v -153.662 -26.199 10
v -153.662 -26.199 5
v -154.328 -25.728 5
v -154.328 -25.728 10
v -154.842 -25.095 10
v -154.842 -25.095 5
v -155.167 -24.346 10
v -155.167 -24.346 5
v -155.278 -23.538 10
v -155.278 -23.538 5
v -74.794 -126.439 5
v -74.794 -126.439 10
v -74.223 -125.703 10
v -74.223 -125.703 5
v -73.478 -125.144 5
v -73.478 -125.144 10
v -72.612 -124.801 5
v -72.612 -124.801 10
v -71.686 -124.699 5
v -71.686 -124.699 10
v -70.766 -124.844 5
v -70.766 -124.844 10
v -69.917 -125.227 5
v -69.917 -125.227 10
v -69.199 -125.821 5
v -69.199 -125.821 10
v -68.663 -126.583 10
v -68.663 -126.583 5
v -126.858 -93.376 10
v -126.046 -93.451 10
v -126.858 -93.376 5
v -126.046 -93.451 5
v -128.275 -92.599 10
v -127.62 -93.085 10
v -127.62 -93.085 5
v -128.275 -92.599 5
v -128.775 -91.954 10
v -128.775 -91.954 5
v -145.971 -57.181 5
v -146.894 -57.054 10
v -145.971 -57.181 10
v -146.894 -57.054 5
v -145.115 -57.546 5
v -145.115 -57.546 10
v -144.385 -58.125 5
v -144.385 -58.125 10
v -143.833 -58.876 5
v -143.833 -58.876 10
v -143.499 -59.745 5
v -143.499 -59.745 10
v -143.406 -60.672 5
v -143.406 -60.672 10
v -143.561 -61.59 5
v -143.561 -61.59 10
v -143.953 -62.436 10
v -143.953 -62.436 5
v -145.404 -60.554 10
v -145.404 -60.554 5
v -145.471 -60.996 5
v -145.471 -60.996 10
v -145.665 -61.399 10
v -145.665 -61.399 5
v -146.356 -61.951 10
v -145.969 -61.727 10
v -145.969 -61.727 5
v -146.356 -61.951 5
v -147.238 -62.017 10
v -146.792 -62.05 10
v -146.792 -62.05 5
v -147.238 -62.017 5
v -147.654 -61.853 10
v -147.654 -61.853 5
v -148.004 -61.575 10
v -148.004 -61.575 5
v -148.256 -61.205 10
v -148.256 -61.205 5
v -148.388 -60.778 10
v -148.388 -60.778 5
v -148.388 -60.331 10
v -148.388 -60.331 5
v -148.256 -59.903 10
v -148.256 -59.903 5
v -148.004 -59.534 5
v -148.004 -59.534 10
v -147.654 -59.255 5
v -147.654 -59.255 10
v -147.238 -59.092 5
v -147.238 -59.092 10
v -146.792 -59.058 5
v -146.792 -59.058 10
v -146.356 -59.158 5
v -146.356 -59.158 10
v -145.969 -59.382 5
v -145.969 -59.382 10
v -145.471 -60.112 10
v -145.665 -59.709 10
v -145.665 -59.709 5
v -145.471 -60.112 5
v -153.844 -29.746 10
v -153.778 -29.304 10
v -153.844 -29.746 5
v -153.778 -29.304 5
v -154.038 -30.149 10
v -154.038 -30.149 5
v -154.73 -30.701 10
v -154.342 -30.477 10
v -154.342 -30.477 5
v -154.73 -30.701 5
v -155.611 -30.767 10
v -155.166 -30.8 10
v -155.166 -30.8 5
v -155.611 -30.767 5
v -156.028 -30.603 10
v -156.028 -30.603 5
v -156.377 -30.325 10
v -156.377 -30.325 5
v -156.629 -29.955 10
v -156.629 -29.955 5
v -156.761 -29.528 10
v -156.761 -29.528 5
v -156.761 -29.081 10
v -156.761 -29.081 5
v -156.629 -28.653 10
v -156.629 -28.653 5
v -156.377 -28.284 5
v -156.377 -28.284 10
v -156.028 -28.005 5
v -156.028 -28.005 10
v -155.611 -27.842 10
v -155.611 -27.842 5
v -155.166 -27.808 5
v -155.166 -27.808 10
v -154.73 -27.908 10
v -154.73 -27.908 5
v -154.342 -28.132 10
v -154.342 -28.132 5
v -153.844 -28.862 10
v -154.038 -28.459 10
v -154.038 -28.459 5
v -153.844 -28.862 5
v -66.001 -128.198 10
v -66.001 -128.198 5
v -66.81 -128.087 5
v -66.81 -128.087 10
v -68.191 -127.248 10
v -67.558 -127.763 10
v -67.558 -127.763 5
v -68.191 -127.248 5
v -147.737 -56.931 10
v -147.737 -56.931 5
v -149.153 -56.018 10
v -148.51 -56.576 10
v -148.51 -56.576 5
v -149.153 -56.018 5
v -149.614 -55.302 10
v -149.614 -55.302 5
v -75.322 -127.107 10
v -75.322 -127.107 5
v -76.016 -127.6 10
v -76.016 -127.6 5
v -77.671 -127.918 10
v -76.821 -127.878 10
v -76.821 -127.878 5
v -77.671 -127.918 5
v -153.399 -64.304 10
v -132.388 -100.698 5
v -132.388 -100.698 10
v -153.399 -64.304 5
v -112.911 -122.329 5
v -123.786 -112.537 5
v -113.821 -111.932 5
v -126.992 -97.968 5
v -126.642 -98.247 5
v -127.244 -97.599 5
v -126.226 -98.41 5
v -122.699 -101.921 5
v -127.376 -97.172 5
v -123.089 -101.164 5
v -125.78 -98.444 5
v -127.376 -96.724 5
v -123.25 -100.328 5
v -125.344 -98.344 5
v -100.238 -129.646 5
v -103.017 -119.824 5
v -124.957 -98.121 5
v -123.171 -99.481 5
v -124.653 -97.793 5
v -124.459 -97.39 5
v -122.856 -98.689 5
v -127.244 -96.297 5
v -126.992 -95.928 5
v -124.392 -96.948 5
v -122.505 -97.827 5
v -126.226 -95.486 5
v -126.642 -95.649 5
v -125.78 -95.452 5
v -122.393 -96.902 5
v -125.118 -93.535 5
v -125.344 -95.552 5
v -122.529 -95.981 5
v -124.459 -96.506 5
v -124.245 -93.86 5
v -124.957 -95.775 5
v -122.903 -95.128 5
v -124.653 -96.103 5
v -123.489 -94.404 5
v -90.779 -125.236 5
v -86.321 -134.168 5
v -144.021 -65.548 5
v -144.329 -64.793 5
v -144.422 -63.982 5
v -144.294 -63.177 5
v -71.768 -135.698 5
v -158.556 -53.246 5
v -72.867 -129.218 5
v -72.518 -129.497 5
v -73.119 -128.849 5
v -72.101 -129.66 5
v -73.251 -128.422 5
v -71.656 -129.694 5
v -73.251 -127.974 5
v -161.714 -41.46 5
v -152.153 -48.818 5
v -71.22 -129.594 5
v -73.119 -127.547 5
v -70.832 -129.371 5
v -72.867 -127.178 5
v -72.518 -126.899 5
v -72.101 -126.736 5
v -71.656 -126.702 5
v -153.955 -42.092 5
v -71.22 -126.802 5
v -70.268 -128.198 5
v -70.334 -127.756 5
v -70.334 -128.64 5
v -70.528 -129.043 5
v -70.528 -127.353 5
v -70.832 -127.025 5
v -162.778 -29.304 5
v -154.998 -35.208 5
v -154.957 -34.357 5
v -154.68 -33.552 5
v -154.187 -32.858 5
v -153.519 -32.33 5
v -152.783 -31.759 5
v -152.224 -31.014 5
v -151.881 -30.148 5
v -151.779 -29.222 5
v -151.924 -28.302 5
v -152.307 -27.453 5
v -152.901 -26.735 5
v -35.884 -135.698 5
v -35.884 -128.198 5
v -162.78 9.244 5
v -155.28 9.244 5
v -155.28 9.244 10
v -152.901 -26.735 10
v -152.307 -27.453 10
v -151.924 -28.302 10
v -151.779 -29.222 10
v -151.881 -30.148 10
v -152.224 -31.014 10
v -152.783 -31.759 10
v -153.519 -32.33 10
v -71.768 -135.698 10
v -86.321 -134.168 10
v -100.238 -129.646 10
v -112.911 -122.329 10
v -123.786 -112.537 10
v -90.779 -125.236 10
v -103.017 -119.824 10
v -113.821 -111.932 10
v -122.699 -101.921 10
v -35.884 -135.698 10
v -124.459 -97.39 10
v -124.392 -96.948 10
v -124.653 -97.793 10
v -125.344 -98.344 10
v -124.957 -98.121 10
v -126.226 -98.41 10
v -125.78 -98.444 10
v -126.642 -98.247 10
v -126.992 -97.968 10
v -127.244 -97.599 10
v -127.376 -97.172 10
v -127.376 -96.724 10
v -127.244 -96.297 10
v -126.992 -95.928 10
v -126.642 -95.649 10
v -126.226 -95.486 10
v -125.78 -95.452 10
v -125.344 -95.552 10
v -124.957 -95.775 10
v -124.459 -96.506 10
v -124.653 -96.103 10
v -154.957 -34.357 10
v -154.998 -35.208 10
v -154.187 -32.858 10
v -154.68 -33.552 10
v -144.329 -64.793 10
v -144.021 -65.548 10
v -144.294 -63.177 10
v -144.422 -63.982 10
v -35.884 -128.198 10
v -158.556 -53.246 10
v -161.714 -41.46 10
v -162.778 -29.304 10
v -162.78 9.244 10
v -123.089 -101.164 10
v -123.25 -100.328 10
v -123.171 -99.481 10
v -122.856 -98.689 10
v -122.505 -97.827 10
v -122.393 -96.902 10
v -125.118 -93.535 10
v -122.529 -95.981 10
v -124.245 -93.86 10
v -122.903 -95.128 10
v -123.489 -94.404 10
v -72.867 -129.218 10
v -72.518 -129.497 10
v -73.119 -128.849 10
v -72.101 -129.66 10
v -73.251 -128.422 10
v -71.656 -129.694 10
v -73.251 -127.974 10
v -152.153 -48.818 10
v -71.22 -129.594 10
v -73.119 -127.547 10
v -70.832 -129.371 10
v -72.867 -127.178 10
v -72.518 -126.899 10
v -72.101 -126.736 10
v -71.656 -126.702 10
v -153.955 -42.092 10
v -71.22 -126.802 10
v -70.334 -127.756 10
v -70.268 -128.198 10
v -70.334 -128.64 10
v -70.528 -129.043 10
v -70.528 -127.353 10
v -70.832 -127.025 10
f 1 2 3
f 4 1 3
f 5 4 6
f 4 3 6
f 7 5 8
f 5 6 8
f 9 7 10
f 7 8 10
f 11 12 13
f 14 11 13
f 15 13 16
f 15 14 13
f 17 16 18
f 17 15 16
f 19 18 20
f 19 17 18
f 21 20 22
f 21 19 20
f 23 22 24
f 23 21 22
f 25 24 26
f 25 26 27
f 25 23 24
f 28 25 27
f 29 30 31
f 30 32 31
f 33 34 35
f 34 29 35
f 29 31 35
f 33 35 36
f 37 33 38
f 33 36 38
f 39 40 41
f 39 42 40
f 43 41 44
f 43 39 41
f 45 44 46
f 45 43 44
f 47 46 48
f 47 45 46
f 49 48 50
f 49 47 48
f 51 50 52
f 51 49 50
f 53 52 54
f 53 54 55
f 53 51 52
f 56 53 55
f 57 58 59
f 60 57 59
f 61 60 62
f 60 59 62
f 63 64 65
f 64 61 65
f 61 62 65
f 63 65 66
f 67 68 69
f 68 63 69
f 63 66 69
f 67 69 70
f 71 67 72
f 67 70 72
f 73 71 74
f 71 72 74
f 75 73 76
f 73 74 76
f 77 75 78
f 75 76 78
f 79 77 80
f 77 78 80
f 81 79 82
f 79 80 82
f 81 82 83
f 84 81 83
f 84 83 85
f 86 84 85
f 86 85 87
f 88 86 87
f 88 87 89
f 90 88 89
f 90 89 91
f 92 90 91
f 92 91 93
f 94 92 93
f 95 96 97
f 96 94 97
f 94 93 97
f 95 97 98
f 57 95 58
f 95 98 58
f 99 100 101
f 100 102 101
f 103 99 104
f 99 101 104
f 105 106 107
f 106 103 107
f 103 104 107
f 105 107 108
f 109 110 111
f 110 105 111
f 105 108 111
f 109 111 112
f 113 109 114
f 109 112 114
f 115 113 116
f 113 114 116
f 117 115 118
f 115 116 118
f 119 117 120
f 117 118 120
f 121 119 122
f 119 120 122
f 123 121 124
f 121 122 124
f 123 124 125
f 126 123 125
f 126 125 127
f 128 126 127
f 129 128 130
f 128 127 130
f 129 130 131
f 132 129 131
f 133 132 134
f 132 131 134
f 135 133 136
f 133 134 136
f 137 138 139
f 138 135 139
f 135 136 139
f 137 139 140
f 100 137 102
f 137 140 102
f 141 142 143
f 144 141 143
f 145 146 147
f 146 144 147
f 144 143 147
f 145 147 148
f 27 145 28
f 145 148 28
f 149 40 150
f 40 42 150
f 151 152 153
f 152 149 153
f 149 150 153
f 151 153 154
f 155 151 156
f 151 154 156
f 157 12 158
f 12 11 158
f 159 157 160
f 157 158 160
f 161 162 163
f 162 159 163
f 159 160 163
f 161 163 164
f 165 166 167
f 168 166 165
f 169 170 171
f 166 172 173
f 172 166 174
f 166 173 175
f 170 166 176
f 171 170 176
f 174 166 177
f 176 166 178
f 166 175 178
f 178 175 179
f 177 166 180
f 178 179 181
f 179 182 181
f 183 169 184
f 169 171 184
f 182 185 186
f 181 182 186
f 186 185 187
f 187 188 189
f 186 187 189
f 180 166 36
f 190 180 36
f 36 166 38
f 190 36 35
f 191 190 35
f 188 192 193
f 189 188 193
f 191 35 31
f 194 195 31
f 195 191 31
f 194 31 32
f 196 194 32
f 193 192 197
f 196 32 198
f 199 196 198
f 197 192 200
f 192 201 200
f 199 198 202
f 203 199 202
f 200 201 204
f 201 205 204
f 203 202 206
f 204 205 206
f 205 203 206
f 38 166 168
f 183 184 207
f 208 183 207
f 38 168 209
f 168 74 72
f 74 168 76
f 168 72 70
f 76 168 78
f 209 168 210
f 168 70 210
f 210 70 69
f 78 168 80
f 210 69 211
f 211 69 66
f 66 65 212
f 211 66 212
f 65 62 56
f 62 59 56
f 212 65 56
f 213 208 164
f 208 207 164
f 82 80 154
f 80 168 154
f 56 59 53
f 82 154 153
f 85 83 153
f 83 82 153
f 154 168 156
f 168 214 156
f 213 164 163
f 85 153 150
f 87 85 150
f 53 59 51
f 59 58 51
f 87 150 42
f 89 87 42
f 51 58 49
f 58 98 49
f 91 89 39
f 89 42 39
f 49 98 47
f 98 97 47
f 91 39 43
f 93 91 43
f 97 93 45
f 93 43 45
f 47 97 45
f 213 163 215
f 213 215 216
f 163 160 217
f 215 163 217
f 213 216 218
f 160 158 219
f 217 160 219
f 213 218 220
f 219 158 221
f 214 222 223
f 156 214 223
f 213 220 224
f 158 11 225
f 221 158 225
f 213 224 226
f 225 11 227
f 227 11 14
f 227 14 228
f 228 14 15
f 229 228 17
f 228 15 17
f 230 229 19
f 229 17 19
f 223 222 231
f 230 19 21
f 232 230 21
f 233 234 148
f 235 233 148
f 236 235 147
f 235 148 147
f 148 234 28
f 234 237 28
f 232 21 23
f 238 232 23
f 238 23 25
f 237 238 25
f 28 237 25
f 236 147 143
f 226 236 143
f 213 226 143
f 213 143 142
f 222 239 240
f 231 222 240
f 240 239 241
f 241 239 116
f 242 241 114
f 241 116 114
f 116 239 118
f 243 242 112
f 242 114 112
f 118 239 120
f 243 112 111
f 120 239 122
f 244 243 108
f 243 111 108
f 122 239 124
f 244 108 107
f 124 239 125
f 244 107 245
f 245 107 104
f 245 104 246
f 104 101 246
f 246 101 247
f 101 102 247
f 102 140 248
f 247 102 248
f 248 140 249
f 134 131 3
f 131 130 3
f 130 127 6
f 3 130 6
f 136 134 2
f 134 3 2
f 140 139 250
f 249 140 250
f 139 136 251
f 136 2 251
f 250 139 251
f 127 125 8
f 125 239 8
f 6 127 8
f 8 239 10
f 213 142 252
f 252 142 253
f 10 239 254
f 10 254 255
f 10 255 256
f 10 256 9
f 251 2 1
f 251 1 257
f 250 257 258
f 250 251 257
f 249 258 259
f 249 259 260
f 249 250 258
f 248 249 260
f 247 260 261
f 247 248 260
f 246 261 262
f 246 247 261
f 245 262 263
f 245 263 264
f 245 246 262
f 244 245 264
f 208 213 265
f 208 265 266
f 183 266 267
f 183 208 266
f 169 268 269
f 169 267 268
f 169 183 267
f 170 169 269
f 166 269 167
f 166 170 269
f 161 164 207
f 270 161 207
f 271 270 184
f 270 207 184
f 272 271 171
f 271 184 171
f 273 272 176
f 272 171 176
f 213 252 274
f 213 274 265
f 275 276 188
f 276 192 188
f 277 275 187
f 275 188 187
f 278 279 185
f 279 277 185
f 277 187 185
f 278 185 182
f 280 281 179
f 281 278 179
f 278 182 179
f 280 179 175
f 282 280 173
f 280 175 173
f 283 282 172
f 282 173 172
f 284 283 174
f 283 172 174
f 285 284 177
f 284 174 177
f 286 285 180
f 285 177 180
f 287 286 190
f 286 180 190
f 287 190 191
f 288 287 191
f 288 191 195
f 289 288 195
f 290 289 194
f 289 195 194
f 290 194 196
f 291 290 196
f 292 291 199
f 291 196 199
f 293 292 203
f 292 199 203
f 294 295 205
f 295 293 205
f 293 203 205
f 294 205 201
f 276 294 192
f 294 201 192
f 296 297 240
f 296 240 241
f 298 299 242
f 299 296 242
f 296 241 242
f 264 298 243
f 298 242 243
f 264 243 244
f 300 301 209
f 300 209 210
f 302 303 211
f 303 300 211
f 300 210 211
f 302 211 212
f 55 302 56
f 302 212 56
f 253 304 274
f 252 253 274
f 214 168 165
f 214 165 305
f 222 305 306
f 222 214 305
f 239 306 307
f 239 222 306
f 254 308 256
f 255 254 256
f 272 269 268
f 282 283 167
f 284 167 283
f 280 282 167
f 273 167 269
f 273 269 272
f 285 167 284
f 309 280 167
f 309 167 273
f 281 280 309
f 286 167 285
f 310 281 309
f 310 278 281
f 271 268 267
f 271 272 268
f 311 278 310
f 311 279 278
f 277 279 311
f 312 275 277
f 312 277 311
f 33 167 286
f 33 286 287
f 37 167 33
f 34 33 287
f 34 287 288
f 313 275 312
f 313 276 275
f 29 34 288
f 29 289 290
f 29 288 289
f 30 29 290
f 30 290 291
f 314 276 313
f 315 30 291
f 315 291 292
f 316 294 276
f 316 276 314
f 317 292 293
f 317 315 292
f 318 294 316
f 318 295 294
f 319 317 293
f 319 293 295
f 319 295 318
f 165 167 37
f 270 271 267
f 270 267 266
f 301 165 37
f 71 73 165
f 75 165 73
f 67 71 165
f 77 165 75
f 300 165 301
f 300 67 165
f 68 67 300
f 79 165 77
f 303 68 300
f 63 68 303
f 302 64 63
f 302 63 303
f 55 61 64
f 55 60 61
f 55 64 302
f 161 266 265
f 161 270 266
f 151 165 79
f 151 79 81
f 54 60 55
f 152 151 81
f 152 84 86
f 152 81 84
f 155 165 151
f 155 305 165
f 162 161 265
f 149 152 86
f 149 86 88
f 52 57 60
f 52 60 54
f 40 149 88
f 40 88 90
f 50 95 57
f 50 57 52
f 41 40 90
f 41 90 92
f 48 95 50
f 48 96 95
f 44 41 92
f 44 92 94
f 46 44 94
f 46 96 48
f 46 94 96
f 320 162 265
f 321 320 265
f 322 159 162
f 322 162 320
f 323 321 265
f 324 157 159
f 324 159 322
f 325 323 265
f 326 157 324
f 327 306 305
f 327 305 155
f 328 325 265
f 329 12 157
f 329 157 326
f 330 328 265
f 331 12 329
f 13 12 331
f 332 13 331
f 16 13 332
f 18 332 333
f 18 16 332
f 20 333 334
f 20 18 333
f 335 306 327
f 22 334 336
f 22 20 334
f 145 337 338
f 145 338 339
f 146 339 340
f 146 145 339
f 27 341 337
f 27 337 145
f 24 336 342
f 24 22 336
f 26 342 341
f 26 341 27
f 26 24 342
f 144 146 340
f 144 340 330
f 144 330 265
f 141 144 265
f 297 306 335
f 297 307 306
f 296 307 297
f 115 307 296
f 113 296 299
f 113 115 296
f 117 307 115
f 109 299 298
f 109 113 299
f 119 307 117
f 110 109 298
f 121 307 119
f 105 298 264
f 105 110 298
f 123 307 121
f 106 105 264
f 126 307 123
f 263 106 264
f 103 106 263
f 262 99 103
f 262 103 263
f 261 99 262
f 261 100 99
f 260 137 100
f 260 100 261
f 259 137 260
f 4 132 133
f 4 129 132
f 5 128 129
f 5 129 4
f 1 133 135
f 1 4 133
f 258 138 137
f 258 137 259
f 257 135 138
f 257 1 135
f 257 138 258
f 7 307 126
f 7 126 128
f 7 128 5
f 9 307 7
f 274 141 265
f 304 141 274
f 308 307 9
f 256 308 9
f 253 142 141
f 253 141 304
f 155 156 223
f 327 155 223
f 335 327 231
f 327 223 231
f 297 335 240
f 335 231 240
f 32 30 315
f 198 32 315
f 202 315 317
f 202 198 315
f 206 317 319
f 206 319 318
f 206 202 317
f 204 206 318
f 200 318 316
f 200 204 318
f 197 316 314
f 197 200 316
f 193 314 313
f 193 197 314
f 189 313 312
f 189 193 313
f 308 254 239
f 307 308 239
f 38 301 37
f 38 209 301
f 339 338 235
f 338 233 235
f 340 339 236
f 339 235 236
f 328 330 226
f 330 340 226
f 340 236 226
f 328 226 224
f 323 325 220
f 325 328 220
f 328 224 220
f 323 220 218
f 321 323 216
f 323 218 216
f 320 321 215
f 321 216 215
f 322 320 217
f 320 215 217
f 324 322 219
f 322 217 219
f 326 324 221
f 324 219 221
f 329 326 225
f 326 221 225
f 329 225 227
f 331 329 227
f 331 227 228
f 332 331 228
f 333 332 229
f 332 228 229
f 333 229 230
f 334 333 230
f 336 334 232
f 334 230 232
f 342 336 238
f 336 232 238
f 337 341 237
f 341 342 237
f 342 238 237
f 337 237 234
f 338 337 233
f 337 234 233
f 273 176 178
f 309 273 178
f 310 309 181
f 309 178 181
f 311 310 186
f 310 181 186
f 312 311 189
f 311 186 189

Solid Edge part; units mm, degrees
sketch "Sketch1" plane through (0.0007, 14.651, 5) normal (0, 0, 1) x (1, 0, 0)
  line L0 (-114.0407, 98.8093) -> (-57.2599, 131.5929)
  arc A0 (-54.1474, 131.5247) -> (-57.2599, 131.5929) centre (-55.7598, 128.9948) ccw
  arc A1 (-47.0142, 137.1861) -> (-48.7662, 134.4664) centre (-45.7662, 134.458) ccw
  arc A2 (-47.0142, 137.1861) -> (-26.9146, 142.5706) centre (-21.0226, 80.3698) cw
  arc A3 (-24.0376, 141.0909) -> (-26.9146, 142.5706) centre (-26.6317, 139.5839) ccw
  arc A4 (-15.245, 142.849) -> (-17.9063, 141.2336) centre (-15.245, 139.849) ccw
  line L1 (-15.245, 142.849) -> (15.2436, 142.849)
  arc A5 (17.905, 141.2336) -> (15.2436, 142.849) centre (15.2436, 139.849) ccw
  arc A6 (26.9132, 142.5696) -> (24.036, 141.0904) centre (26.6298, 139.583) ccw
  arc A7 (26.9132, 142.5696) -> (47.0027, 137.1869) centre (21.0099, 80.3561) cw
  arc A8 (48.7549, 134.4673) -> (47.0027, 137.1869) centre (45.7549, 134.4587) ccw
  arc A9 (57.2487, 131.5943) -> (54.1362, 131.526) centre (55.7487, 128.9962) ccw
  line L2 (57.2487, 131.5943) -> (114.0299, 98.8129)
  arc A10 (115.5271, 96.0833) -> (114.0299, 98.8129) centre (112.5299, 96.2148) ccw
  arc A11 (124.0003, 92.7805) -> (120.7849, 92.9052) centre (122.2944, 90.3127) ccw
  arc A12 (124.0003, 92.7805) -> (155.0355, 39.027) centre (82.7747, 33.1424) cw
  arc A13 (153.5358, 36.1799) -> (155.0355, 39.027) centre (152.0454, 38.7835) ccw
  arc A14 (155.2747, 27.3761) -> (153.6593, 30.0375) centre (152.2747, 27.3761) ccw
  line L3 (155.2747, 27.3761) -> (155.2747, -38.192)
  arc A15 (153.6593, -40.8534) -> (155.2747, -38.192) centre (152.2747, -38.192) ccw
  arc A16 (154.9954, -49.8615) -> (153.5161, -46.9844) centre (152.0088, -49.5782) ccw
  arc A17 (154.9954, -49.8615) -> (149.6134, -69.9554) centre (92.7533, -43.9583) cw
  arc A18 (146.8942, -71.7079) -> (149.6134, -69.9554) centre (146.8851, -68.7079) ccw
  arc A19 (144.0217, -80.2016) -> (143.9534, -77.0892) centre (141.4236, -78.7016) ccw
  line L4 (144.0217, -80.2016) -> (127.6444, -108.5679)
  arc A20 (122.7007, -116.5716) -> (122.8583, -113.3403) centre (120.256, -114.8329) ccw
  arc A21 (77.6703, -142.5696) -> (122.7007, -116.5716) centre (71.767, -80.3476) ccw
  arc A22 (74.7931, -141.0904) -> (77.6703, -142.5696) centre (77.3869, -139.583) ccw
  arc A23 (66.0007, -142.849) -> (68.6621, -141.2336) centre (66.0007, -139.849) ccw
  line L5 (5.7656, -142.849) -> (66.0007, -142.849)
  arc A24 (3.1042, -141.2336) -> (5.7656, -142.849) centre (5.7656, -139.849) ccw
  arc A25 (-5.767, -142.849) -> (-3.1056, -141.2336) centre (-5.767, -139.849) ccw
  line L6 (-66.0021, -142.849) -> (-5.767, -142.849)
  arc A26 (-68.6634, -141.2336) -> (-66.0021, -142.849) centre (-66.0021, -139.849) ccw
  arc A27 (-77.6716, -142.5694) -> (-74.7944, -141.0903) centre (-77.3881, -139.5828) ccw
  arc A28 (-122.6994, -116.5717) -> (-77.6716, -142.5694) centre (-71.7665, -80.349) ccw
  arc A29 (-122.857, -113.3404) -> (-122.6994, -116.5717) centre (-120.2547, -114.833) ccw
  arc A30 (-128.7762, -106.6053) -> (-126.0465, -108.1024) centre (-126.1781, -105.1053) ccw
  line L7 (-144.0218, -80.199) -> (-128.7762, -106.6053)
  arc A31 (-143.9535, -77.0865) -> (-144.0218, -80.199) centre (-141.4237, -78.699) ccw
  arc A32 (-149.6144, -69.9531) -> (-146.8949, -71.7053) centre (-146.8862, -68.7053) ccw
  arc A33 (-154.9987, -49.8585) -> (-149.6144, -69.9531) centre (-92.7672, -43.9523) ccw
  arc A34 (-153.5196, -46.9813) -> (-154.9987, -49.8585) centre (-152.0122, -49.5751) ccw
  arc A35 (-155.2786, -38.189) -> (-153.6631, -40.8503) centre (-152.2786, -38.1889) ccw
  line L8 (-155.2818, 27.3758) -> (-155.2786, -38.189)
  arc A36 (-153.6665, 30.0373) -> (-155.2818, 27.3758) centre (-152.2818, 27.376) ccw
  arc A37 (-155.0428, 39.0267) -> (-153.5432, 36.1796) centre (-152.0527, 38.7832) ccw
  arc A38 (-124.0109, 92.7765) -> (-155.0428, 39.0267) centre (-82.7847, 33.1421) ccw
  arc A39 (-120.7955, 92.9014) -> (-124.0109, 92.7765) centre (-122.3049, 90.3088) ccw
  arc A40 (-114.0407, 98.8093) -> (-115.5378, 96.0796) centre (-112.5406, 96.2112) ccw
  arc A41 (-48.7662, 134.4664) -> (-54.1474, 131.5247) centre (-52.2662, 134.4761) cw
  arc A42 (-17.9064, 141.2336) -> (-24.0377, 141.0909) centre (-21.0113, 142.849) cw
  arc A43 (24.036, 141.0904) -> (17.905, 141.2336) centre (21.0099, 142.849) cw
  arc A44 (54.1362, 131.526) -> (48.7549, 134.4673) centre (52.2549, 134.4774) cw
  arc A45 (120.7849, 92.9052) -> (115.5271, 96.0832) centre (119.0237, 95.9298) cw
  arc A46 (153.6593, 30.0375) -> (153.5358, 36.1799) centre (155.2747, 33.1424) cw
  arc A47 (153.5161, -46.9844) -> (153.6593, -40.8534) centre (155.2747, -43.9583) cw
  arc A48 (143.9534, -77.0891) -> (146.8942, -71.7079) centre (146.9048, -75.2079) cw
  arc A49 (122.8584, -113.3404) -> (127.6444, -108.5679) centre (125.8944, -111.599) cw
  arc A50 (68.6621, -141.2336) -> (74.7931, -141.0904) centre (71.767, -142.849) cw
  arc A51 (-3.1056, -141.2336) -> (3.1042, -141.2336) centre (-0.0007, -142.849) cw
  arc A52 (-74.7944, -141.0903) -> (-68.6635, -141.2336) centre (-71.7684, -142.849) cw
  arc A53 (-126.0466, -108.1024) -> (-122.857, -113.3404) centre (-125.8931, -111.599) cw
  arc A54 (-146.8949, -71.7053) -> (-143.9536, -77.0866) centre (-146.905, -75.2053) cw
  arc A55 (-153.6632, -40.8503) -> (-153.5196, -46.9813) centre (-155.2784, -43.9553) cw
  arc A56 (-153.5432, 36.1796) -> (-153.6665, 30.0373) centre (-155.2821, 33.1421) cw
  arc A57 (-115.5377, 96.0796) -> (-120.7955, 92.9014) centre (-119.0344, 95.926) cw
  line L9 (-56.0166, 140.971) -> (-122.7845, 102.4212)
  arc A58 (-162.7821, 33.1421) -> (-122.7845, 102.4212) centre (-82.7847, 33.1421) cw
  line L10 (-162.7821, 33.1421) -> (-162.7784, -43.9553)
  arc A59 (-162.7784, -43.9553) -> (-153.4002, -78.9553) centre (-92.7784, -43.9553) ccw
  line L11 (-132.3882, -115.349) -> (-153.4002, -78.9553)
  arc A60 (-132.3882, -115.349) -> (-71.7683, -150.349) centre (-71.7665, -80.349) ccw
  line L12 (71.767, -150.349) -> (-71.7683, -150.349)
  arc A61 (71.767, -150.349) -> (132.3896, -115.349) centre (71.7678, -80.349) ccw
  line L13 (132.3896, -115.349) -> (153.4002, -78.9576)
  arc A62 (162.7747, -43.9583) -> (153.4002, -78.9576) centre (92.791, -43.9684) cw
  line L14 (162.7747, 33.1424) -> (162.7747, -43.9583)
  arc A63 (122.7736, 102.4251) -> (162.7747, 33.1424) centre (82.7747, 33.1424) cw
  line L15 (56.0045, 140.9728) -> (122.7736, 102.4251)
  arc A64 (21.0099, 150.349) -> (56.0045, 140.9728) centre (21.008, 80.349) cw
  line L16 (-21.0112, 150.349) -> (21.0099, 150.349)
  arc A65 (-32.5074, 149.4015) -> (-21.0112, 150.349) centre (-20.997, 79.961) cw
  arc A66 (-44.641, 146.2432) -> (-32.5074, 149.4015) centre (-21.0122, 80.3518) cw
  arc A67 (-56.0166, 140.971) -> (-44.641, 146.2432) centre (-21.0122, 80.3518) cw
  circle A68 centre (-71.7683, -142.849) radius 1.5
  circle A69 centre (-0.0007, -142.849) radius 1.5
  circle A70 centre (-125.893, -111.599) radius 1.5
  circle A71 centre (-146.905, -75.2053) radius 1.5
  circle A72 centre (-155.2784, -43.9553) radius 1.5
  circle A73 centre (-155.2821, 33.1421) radius 1.5
  circle A74 centre (-119.0344, 95.9261) radius 1.5
  circle A75 centre (-52.2662, 134.4761) radius 1.5
  circle A76 centre (-21.0112, 142.849) radius 1.5
  circle A77 centre (21.0099, 142.849) radius 1.5
  circle A78 centre (52.2549, 134.4774) radius 1.5
  circle A79 centre (119.0237, 95.9298) radius 1.5
  circle A80 centre (155.2747, 33.1424) radius 1.5
  circle A81 centre (155.2747, -43.9583) radius 1.5
  circle A82 centre (146.9048, -75.2079) radius 1.5
  circle A83 centre (125.8944, -111.599) radius 1.5
  circle A84 centre (71.767, -142.849) radius 1.5
extrude "ExtrudedProtrusion_7" add sketch "Sketch1" along normal blind 5
sketch "Sketch2" plane through (-0.003, 14.651, 10) normal (0, 0, 1) x (1, 0, 0)
  line L0 (-168.1883, -5.4066) -> (170.0115, -5.4066)
  line L1 (170.0115, -5.4066) -> (170.0115, 153.6029)
  line L2 (170.0115, 153.6029) -> (-168.1883, 153.6029)
  line L3 (-168.1883, 153.6029) -> (-168.1883, -5.4066)
extrude "Cutout1" cut sketch "Sketch2" against normal up to next
sketch "Sketch3" plane through (-0.0021, -63.2268, 10) normal (0, 0, 1) x (1, 0, 0)
  line L0 (-35.8817, -72.4712) -> (180.5414, -72.4712)
  line L1 (180.5414, -72.4712) -> (180.5414, 89.6223)
  line L2 (180.5414, 89.6223) -> (-35.8817, 89.6223)
  line L3 (-35.8817, 89.6223) -> (-35.8817, -72.4712)
extrude "Cutout2" cut sketch "Sketch3" against normal up to next
properties material "Polycarbonate"
